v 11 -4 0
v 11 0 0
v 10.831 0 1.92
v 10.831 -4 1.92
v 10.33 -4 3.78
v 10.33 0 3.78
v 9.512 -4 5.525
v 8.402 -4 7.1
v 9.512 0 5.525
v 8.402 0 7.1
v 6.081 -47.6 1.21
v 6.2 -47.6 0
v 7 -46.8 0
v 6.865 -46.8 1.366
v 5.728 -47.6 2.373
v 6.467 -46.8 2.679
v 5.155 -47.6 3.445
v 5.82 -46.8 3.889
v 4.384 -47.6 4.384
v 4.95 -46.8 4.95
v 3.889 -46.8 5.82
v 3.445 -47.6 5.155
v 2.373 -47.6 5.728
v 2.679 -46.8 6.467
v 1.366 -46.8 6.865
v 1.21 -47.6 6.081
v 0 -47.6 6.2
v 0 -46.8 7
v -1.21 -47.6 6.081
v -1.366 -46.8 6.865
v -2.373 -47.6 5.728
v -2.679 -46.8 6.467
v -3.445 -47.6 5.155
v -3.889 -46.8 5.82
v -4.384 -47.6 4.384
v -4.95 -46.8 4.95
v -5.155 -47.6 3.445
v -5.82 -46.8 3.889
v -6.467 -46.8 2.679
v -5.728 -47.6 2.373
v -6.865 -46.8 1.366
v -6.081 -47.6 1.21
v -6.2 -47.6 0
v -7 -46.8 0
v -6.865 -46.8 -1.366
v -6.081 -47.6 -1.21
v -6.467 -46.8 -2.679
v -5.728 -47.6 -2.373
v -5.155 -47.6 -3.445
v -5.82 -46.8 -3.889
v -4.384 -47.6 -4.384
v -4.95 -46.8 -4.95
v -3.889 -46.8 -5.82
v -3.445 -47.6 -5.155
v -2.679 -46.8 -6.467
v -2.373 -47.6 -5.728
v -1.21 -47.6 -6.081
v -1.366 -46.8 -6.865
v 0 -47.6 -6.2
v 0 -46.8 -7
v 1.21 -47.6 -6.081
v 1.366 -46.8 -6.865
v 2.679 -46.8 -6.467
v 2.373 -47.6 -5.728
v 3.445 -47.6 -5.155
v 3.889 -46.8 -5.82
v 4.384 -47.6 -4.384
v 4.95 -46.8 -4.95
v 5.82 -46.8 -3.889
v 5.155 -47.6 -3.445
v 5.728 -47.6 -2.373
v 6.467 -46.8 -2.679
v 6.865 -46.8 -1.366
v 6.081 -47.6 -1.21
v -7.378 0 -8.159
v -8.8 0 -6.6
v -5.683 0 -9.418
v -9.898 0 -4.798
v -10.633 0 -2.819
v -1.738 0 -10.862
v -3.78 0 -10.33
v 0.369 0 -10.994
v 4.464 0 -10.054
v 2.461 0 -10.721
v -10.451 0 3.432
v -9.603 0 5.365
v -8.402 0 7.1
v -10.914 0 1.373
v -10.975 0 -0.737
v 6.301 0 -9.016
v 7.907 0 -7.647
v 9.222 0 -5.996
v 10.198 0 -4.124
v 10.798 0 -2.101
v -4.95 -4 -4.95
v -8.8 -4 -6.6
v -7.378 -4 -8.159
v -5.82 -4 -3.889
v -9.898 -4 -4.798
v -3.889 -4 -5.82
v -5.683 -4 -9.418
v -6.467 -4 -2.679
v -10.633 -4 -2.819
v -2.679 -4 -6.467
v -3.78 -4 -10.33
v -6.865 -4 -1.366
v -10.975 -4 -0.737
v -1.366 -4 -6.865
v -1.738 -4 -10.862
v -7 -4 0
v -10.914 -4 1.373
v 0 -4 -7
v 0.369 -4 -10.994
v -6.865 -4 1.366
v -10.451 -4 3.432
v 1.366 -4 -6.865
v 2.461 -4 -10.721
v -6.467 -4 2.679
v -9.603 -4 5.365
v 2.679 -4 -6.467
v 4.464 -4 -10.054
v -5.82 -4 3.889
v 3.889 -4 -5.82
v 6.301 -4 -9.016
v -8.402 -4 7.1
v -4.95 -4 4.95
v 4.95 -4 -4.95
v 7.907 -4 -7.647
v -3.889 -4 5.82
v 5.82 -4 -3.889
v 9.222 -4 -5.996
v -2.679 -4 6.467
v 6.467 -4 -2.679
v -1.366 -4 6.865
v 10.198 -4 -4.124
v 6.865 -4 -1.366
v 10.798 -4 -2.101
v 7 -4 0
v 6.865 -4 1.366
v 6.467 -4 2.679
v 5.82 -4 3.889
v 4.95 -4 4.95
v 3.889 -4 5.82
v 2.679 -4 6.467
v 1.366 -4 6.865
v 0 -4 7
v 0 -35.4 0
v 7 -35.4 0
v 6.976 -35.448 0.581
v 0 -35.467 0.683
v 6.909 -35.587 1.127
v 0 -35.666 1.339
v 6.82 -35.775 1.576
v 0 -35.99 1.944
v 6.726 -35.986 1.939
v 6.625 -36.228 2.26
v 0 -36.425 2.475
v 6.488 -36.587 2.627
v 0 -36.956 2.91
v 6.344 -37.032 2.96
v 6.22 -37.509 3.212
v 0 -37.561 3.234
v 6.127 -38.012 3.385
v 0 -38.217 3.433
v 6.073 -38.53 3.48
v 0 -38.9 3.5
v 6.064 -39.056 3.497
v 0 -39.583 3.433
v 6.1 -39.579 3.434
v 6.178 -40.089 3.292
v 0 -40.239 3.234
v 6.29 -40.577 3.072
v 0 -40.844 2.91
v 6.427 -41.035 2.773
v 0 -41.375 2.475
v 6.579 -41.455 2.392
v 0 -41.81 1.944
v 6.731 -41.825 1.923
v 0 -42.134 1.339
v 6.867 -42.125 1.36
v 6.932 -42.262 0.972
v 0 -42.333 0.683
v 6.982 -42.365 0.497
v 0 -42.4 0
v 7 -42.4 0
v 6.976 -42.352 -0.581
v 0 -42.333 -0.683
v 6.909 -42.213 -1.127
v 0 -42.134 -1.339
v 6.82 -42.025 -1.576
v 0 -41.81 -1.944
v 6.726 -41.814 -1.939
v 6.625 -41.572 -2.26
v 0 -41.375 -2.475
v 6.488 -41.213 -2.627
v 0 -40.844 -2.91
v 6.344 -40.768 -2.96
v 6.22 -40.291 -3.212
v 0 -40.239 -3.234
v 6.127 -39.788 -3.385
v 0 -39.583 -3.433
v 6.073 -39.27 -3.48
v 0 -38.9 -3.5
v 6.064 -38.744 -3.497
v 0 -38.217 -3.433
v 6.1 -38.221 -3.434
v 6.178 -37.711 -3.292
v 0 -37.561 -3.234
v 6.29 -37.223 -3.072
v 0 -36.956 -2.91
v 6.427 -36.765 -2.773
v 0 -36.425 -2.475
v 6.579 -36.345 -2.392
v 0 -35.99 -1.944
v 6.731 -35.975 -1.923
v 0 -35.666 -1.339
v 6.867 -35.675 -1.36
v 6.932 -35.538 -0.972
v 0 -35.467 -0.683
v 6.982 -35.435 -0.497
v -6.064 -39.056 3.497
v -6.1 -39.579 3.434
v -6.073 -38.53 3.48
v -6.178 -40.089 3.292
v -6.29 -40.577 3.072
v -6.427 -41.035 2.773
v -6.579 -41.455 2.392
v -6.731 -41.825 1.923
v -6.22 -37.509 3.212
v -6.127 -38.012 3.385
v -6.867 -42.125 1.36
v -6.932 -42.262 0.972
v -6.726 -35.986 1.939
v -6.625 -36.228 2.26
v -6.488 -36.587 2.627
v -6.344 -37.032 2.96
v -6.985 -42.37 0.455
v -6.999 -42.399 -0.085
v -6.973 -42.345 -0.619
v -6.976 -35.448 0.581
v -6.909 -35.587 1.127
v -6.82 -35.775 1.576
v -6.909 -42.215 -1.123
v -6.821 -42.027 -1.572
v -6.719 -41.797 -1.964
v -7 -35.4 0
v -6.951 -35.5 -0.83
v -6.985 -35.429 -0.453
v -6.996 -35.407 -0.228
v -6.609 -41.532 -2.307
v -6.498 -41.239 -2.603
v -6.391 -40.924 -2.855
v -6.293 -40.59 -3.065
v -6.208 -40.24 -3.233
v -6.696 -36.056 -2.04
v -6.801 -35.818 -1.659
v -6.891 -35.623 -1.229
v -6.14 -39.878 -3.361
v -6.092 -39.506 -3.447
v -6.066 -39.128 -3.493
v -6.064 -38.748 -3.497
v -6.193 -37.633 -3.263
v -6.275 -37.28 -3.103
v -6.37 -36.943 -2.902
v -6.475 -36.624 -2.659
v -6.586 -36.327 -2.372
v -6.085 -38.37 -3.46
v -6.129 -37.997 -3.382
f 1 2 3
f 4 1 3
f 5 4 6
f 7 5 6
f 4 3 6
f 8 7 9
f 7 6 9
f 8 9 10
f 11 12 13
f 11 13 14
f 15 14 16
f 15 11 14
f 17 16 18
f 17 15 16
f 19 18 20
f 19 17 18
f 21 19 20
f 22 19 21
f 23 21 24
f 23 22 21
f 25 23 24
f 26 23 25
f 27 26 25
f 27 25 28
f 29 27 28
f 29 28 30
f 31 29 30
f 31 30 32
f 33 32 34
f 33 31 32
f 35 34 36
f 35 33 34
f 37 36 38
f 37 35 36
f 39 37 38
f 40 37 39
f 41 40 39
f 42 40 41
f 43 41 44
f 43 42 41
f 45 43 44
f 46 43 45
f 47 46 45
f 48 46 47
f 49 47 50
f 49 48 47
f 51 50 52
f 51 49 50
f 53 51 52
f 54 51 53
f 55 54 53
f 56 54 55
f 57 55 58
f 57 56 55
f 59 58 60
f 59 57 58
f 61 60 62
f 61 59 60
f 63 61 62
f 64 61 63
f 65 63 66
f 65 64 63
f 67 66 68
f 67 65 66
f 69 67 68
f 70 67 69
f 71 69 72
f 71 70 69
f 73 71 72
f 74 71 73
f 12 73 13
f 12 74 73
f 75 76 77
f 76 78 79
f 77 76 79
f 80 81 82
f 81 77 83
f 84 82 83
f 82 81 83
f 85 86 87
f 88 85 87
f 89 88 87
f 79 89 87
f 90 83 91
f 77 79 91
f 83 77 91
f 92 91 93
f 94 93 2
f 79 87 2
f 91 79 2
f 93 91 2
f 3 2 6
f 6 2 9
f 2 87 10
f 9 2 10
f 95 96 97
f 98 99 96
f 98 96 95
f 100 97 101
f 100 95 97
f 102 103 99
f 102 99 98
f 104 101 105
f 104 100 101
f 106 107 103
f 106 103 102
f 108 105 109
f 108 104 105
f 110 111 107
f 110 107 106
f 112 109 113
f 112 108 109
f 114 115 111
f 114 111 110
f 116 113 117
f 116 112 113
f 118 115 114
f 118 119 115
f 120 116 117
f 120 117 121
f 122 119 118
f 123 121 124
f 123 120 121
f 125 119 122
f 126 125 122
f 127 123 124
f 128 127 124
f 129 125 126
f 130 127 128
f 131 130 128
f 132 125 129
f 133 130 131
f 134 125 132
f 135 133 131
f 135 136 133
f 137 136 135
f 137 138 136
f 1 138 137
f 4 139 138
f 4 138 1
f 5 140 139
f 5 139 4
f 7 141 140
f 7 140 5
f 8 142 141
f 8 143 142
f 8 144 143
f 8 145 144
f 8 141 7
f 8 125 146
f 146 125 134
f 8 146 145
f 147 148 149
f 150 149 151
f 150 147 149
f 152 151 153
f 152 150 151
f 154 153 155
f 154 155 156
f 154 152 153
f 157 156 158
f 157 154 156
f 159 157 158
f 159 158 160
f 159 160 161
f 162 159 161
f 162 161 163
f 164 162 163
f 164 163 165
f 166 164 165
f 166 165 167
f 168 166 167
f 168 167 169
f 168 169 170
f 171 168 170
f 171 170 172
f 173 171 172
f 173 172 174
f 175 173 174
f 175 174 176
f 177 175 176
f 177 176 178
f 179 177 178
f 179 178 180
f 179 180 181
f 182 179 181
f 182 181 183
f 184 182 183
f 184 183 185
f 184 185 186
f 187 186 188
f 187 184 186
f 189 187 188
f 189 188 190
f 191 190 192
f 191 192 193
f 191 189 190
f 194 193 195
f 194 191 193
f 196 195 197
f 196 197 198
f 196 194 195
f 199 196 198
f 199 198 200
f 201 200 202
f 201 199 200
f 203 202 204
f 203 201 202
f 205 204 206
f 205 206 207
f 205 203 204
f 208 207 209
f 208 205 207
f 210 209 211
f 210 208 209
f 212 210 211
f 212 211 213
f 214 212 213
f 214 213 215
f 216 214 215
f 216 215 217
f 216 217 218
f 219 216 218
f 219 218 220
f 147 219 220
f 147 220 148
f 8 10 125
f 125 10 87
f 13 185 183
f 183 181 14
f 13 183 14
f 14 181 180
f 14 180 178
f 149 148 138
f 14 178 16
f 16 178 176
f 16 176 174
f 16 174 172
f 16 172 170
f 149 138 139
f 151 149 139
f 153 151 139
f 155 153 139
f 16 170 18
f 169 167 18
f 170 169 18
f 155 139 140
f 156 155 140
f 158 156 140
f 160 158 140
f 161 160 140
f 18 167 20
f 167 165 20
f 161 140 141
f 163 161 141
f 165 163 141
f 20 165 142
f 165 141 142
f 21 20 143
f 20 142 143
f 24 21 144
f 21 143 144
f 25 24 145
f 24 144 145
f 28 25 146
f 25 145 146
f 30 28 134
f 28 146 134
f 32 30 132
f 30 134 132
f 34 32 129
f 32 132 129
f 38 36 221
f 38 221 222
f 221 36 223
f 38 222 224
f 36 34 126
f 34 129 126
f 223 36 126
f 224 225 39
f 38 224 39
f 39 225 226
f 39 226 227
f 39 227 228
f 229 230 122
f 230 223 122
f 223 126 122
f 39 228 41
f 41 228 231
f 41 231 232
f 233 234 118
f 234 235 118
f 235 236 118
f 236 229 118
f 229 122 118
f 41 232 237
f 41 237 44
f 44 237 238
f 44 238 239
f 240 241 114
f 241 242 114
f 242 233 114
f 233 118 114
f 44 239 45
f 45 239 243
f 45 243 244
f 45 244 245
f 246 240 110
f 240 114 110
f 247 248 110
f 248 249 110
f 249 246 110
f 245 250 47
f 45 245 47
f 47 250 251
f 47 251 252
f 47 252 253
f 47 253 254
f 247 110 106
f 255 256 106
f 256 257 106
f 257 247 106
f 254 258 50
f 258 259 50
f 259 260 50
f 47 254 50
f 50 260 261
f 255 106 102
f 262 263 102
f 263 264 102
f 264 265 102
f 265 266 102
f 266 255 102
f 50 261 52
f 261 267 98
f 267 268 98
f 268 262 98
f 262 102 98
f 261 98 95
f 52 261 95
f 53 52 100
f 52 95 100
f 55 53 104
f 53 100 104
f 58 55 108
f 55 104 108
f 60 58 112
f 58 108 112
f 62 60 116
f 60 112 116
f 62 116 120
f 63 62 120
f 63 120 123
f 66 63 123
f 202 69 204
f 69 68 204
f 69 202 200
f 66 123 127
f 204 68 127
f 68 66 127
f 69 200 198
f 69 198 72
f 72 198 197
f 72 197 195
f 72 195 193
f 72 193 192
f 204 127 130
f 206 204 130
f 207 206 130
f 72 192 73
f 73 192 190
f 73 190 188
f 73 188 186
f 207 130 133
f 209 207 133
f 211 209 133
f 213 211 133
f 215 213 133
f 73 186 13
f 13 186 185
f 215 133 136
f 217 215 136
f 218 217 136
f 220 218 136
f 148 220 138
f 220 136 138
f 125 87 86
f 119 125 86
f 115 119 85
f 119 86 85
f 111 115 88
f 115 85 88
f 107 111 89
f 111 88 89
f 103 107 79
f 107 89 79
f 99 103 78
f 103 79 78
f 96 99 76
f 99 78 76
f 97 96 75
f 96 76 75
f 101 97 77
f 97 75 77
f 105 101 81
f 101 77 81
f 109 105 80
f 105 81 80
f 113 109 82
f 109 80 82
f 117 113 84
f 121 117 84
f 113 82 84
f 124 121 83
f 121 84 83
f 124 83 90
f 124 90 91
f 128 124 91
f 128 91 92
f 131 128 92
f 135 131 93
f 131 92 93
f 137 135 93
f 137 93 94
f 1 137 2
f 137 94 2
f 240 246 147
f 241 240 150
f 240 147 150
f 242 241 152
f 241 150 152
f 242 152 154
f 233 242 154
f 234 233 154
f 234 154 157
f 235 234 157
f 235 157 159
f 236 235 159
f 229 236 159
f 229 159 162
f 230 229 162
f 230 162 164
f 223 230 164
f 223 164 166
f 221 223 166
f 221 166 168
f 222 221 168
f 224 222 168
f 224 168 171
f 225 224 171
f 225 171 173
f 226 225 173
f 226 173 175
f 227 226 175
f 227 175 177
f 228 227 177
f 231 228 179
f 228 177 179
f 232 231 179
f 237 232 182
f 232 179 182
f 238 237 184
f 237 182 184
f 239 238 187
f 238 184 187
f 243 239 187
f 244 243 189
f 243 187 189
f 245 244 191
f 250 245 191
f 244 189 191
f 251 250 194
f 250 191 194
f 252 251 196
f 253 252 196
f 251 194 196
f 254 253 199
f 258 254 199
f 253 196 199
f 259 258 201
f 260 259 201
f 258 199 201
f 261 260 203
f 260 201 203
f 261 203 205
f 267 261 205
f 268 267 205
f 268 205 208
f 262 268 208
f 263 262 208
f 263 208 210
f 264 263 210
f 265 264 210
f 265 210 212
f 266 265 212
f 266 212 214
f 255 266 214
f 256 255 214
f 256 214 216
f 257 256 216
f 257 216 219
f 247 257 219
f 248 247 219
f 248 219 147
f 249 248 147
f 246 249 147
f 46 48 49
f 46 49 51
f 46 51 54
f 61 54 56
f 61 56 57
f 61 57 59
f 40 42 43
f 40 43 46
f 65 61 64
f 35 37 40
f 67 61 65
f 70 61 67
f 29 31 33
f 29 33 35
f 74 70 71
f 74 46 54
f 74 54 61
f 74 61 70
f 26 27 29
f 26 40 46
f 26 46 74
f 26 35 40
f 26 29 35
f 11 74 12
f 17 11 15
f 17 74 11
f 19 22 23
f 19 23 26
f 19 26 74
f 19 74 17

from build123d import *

# Parameters (mm, degrees)
F0_R          = 7
F1_DEPTH      = 4
F2_DEPTH      = 47.6
F3_SIZE       = 0.8
F4_R          = 3.5
F5_DEPTH      = 14.3
F5_DEPTH_BACK = 14.4


with BuildPart() as f1:
    # F0 (on Front) → F1 (new body)
    with BuildSketch(Plane.XZ):
        with BuildLine():
            ThreePointArc((-8.401786, 7.1), (-3.780235, -10.330045), (11, 0))
            ThreePointArc((11, 0), (10.330045, 3.780235), (8.401786, 7.1))
            Line((8.401786, 7.1), (-8.401786, 7.1))
        make_face()
        Circle(F0_R, mode=Mode.SUBTRACT)
    extrude(amount=F1_DEPTH)

    # F0 (on Front) → F2 (join)
    with BuildSketch(Plane.XZ):
        Circle(F0_R)
    extrude(amount=F2_DEPTH)

    # F3
    f3_edges = [f1.edges().sort_by_distance(p)[0] for p in [
        (-7, -47.6, 0),
    ]]
    chamfer(f3_edges, length=F3_SIZE)

    # F4 (on Right) → F5 (cut, two sides)
    with BuildSketch(Plane.YZ) as f5_sk:
        with Locations((-38.9, 0)):
            Circle(F4_R)
    extrude(amount=F5_DEPTH, mode=Mode.SUBTRACT)
    extrude(f5_sk.sketch, amount=-F5_DEPTH_BACK, mode=Mode.SUBTRACT)


solid = f1.part
